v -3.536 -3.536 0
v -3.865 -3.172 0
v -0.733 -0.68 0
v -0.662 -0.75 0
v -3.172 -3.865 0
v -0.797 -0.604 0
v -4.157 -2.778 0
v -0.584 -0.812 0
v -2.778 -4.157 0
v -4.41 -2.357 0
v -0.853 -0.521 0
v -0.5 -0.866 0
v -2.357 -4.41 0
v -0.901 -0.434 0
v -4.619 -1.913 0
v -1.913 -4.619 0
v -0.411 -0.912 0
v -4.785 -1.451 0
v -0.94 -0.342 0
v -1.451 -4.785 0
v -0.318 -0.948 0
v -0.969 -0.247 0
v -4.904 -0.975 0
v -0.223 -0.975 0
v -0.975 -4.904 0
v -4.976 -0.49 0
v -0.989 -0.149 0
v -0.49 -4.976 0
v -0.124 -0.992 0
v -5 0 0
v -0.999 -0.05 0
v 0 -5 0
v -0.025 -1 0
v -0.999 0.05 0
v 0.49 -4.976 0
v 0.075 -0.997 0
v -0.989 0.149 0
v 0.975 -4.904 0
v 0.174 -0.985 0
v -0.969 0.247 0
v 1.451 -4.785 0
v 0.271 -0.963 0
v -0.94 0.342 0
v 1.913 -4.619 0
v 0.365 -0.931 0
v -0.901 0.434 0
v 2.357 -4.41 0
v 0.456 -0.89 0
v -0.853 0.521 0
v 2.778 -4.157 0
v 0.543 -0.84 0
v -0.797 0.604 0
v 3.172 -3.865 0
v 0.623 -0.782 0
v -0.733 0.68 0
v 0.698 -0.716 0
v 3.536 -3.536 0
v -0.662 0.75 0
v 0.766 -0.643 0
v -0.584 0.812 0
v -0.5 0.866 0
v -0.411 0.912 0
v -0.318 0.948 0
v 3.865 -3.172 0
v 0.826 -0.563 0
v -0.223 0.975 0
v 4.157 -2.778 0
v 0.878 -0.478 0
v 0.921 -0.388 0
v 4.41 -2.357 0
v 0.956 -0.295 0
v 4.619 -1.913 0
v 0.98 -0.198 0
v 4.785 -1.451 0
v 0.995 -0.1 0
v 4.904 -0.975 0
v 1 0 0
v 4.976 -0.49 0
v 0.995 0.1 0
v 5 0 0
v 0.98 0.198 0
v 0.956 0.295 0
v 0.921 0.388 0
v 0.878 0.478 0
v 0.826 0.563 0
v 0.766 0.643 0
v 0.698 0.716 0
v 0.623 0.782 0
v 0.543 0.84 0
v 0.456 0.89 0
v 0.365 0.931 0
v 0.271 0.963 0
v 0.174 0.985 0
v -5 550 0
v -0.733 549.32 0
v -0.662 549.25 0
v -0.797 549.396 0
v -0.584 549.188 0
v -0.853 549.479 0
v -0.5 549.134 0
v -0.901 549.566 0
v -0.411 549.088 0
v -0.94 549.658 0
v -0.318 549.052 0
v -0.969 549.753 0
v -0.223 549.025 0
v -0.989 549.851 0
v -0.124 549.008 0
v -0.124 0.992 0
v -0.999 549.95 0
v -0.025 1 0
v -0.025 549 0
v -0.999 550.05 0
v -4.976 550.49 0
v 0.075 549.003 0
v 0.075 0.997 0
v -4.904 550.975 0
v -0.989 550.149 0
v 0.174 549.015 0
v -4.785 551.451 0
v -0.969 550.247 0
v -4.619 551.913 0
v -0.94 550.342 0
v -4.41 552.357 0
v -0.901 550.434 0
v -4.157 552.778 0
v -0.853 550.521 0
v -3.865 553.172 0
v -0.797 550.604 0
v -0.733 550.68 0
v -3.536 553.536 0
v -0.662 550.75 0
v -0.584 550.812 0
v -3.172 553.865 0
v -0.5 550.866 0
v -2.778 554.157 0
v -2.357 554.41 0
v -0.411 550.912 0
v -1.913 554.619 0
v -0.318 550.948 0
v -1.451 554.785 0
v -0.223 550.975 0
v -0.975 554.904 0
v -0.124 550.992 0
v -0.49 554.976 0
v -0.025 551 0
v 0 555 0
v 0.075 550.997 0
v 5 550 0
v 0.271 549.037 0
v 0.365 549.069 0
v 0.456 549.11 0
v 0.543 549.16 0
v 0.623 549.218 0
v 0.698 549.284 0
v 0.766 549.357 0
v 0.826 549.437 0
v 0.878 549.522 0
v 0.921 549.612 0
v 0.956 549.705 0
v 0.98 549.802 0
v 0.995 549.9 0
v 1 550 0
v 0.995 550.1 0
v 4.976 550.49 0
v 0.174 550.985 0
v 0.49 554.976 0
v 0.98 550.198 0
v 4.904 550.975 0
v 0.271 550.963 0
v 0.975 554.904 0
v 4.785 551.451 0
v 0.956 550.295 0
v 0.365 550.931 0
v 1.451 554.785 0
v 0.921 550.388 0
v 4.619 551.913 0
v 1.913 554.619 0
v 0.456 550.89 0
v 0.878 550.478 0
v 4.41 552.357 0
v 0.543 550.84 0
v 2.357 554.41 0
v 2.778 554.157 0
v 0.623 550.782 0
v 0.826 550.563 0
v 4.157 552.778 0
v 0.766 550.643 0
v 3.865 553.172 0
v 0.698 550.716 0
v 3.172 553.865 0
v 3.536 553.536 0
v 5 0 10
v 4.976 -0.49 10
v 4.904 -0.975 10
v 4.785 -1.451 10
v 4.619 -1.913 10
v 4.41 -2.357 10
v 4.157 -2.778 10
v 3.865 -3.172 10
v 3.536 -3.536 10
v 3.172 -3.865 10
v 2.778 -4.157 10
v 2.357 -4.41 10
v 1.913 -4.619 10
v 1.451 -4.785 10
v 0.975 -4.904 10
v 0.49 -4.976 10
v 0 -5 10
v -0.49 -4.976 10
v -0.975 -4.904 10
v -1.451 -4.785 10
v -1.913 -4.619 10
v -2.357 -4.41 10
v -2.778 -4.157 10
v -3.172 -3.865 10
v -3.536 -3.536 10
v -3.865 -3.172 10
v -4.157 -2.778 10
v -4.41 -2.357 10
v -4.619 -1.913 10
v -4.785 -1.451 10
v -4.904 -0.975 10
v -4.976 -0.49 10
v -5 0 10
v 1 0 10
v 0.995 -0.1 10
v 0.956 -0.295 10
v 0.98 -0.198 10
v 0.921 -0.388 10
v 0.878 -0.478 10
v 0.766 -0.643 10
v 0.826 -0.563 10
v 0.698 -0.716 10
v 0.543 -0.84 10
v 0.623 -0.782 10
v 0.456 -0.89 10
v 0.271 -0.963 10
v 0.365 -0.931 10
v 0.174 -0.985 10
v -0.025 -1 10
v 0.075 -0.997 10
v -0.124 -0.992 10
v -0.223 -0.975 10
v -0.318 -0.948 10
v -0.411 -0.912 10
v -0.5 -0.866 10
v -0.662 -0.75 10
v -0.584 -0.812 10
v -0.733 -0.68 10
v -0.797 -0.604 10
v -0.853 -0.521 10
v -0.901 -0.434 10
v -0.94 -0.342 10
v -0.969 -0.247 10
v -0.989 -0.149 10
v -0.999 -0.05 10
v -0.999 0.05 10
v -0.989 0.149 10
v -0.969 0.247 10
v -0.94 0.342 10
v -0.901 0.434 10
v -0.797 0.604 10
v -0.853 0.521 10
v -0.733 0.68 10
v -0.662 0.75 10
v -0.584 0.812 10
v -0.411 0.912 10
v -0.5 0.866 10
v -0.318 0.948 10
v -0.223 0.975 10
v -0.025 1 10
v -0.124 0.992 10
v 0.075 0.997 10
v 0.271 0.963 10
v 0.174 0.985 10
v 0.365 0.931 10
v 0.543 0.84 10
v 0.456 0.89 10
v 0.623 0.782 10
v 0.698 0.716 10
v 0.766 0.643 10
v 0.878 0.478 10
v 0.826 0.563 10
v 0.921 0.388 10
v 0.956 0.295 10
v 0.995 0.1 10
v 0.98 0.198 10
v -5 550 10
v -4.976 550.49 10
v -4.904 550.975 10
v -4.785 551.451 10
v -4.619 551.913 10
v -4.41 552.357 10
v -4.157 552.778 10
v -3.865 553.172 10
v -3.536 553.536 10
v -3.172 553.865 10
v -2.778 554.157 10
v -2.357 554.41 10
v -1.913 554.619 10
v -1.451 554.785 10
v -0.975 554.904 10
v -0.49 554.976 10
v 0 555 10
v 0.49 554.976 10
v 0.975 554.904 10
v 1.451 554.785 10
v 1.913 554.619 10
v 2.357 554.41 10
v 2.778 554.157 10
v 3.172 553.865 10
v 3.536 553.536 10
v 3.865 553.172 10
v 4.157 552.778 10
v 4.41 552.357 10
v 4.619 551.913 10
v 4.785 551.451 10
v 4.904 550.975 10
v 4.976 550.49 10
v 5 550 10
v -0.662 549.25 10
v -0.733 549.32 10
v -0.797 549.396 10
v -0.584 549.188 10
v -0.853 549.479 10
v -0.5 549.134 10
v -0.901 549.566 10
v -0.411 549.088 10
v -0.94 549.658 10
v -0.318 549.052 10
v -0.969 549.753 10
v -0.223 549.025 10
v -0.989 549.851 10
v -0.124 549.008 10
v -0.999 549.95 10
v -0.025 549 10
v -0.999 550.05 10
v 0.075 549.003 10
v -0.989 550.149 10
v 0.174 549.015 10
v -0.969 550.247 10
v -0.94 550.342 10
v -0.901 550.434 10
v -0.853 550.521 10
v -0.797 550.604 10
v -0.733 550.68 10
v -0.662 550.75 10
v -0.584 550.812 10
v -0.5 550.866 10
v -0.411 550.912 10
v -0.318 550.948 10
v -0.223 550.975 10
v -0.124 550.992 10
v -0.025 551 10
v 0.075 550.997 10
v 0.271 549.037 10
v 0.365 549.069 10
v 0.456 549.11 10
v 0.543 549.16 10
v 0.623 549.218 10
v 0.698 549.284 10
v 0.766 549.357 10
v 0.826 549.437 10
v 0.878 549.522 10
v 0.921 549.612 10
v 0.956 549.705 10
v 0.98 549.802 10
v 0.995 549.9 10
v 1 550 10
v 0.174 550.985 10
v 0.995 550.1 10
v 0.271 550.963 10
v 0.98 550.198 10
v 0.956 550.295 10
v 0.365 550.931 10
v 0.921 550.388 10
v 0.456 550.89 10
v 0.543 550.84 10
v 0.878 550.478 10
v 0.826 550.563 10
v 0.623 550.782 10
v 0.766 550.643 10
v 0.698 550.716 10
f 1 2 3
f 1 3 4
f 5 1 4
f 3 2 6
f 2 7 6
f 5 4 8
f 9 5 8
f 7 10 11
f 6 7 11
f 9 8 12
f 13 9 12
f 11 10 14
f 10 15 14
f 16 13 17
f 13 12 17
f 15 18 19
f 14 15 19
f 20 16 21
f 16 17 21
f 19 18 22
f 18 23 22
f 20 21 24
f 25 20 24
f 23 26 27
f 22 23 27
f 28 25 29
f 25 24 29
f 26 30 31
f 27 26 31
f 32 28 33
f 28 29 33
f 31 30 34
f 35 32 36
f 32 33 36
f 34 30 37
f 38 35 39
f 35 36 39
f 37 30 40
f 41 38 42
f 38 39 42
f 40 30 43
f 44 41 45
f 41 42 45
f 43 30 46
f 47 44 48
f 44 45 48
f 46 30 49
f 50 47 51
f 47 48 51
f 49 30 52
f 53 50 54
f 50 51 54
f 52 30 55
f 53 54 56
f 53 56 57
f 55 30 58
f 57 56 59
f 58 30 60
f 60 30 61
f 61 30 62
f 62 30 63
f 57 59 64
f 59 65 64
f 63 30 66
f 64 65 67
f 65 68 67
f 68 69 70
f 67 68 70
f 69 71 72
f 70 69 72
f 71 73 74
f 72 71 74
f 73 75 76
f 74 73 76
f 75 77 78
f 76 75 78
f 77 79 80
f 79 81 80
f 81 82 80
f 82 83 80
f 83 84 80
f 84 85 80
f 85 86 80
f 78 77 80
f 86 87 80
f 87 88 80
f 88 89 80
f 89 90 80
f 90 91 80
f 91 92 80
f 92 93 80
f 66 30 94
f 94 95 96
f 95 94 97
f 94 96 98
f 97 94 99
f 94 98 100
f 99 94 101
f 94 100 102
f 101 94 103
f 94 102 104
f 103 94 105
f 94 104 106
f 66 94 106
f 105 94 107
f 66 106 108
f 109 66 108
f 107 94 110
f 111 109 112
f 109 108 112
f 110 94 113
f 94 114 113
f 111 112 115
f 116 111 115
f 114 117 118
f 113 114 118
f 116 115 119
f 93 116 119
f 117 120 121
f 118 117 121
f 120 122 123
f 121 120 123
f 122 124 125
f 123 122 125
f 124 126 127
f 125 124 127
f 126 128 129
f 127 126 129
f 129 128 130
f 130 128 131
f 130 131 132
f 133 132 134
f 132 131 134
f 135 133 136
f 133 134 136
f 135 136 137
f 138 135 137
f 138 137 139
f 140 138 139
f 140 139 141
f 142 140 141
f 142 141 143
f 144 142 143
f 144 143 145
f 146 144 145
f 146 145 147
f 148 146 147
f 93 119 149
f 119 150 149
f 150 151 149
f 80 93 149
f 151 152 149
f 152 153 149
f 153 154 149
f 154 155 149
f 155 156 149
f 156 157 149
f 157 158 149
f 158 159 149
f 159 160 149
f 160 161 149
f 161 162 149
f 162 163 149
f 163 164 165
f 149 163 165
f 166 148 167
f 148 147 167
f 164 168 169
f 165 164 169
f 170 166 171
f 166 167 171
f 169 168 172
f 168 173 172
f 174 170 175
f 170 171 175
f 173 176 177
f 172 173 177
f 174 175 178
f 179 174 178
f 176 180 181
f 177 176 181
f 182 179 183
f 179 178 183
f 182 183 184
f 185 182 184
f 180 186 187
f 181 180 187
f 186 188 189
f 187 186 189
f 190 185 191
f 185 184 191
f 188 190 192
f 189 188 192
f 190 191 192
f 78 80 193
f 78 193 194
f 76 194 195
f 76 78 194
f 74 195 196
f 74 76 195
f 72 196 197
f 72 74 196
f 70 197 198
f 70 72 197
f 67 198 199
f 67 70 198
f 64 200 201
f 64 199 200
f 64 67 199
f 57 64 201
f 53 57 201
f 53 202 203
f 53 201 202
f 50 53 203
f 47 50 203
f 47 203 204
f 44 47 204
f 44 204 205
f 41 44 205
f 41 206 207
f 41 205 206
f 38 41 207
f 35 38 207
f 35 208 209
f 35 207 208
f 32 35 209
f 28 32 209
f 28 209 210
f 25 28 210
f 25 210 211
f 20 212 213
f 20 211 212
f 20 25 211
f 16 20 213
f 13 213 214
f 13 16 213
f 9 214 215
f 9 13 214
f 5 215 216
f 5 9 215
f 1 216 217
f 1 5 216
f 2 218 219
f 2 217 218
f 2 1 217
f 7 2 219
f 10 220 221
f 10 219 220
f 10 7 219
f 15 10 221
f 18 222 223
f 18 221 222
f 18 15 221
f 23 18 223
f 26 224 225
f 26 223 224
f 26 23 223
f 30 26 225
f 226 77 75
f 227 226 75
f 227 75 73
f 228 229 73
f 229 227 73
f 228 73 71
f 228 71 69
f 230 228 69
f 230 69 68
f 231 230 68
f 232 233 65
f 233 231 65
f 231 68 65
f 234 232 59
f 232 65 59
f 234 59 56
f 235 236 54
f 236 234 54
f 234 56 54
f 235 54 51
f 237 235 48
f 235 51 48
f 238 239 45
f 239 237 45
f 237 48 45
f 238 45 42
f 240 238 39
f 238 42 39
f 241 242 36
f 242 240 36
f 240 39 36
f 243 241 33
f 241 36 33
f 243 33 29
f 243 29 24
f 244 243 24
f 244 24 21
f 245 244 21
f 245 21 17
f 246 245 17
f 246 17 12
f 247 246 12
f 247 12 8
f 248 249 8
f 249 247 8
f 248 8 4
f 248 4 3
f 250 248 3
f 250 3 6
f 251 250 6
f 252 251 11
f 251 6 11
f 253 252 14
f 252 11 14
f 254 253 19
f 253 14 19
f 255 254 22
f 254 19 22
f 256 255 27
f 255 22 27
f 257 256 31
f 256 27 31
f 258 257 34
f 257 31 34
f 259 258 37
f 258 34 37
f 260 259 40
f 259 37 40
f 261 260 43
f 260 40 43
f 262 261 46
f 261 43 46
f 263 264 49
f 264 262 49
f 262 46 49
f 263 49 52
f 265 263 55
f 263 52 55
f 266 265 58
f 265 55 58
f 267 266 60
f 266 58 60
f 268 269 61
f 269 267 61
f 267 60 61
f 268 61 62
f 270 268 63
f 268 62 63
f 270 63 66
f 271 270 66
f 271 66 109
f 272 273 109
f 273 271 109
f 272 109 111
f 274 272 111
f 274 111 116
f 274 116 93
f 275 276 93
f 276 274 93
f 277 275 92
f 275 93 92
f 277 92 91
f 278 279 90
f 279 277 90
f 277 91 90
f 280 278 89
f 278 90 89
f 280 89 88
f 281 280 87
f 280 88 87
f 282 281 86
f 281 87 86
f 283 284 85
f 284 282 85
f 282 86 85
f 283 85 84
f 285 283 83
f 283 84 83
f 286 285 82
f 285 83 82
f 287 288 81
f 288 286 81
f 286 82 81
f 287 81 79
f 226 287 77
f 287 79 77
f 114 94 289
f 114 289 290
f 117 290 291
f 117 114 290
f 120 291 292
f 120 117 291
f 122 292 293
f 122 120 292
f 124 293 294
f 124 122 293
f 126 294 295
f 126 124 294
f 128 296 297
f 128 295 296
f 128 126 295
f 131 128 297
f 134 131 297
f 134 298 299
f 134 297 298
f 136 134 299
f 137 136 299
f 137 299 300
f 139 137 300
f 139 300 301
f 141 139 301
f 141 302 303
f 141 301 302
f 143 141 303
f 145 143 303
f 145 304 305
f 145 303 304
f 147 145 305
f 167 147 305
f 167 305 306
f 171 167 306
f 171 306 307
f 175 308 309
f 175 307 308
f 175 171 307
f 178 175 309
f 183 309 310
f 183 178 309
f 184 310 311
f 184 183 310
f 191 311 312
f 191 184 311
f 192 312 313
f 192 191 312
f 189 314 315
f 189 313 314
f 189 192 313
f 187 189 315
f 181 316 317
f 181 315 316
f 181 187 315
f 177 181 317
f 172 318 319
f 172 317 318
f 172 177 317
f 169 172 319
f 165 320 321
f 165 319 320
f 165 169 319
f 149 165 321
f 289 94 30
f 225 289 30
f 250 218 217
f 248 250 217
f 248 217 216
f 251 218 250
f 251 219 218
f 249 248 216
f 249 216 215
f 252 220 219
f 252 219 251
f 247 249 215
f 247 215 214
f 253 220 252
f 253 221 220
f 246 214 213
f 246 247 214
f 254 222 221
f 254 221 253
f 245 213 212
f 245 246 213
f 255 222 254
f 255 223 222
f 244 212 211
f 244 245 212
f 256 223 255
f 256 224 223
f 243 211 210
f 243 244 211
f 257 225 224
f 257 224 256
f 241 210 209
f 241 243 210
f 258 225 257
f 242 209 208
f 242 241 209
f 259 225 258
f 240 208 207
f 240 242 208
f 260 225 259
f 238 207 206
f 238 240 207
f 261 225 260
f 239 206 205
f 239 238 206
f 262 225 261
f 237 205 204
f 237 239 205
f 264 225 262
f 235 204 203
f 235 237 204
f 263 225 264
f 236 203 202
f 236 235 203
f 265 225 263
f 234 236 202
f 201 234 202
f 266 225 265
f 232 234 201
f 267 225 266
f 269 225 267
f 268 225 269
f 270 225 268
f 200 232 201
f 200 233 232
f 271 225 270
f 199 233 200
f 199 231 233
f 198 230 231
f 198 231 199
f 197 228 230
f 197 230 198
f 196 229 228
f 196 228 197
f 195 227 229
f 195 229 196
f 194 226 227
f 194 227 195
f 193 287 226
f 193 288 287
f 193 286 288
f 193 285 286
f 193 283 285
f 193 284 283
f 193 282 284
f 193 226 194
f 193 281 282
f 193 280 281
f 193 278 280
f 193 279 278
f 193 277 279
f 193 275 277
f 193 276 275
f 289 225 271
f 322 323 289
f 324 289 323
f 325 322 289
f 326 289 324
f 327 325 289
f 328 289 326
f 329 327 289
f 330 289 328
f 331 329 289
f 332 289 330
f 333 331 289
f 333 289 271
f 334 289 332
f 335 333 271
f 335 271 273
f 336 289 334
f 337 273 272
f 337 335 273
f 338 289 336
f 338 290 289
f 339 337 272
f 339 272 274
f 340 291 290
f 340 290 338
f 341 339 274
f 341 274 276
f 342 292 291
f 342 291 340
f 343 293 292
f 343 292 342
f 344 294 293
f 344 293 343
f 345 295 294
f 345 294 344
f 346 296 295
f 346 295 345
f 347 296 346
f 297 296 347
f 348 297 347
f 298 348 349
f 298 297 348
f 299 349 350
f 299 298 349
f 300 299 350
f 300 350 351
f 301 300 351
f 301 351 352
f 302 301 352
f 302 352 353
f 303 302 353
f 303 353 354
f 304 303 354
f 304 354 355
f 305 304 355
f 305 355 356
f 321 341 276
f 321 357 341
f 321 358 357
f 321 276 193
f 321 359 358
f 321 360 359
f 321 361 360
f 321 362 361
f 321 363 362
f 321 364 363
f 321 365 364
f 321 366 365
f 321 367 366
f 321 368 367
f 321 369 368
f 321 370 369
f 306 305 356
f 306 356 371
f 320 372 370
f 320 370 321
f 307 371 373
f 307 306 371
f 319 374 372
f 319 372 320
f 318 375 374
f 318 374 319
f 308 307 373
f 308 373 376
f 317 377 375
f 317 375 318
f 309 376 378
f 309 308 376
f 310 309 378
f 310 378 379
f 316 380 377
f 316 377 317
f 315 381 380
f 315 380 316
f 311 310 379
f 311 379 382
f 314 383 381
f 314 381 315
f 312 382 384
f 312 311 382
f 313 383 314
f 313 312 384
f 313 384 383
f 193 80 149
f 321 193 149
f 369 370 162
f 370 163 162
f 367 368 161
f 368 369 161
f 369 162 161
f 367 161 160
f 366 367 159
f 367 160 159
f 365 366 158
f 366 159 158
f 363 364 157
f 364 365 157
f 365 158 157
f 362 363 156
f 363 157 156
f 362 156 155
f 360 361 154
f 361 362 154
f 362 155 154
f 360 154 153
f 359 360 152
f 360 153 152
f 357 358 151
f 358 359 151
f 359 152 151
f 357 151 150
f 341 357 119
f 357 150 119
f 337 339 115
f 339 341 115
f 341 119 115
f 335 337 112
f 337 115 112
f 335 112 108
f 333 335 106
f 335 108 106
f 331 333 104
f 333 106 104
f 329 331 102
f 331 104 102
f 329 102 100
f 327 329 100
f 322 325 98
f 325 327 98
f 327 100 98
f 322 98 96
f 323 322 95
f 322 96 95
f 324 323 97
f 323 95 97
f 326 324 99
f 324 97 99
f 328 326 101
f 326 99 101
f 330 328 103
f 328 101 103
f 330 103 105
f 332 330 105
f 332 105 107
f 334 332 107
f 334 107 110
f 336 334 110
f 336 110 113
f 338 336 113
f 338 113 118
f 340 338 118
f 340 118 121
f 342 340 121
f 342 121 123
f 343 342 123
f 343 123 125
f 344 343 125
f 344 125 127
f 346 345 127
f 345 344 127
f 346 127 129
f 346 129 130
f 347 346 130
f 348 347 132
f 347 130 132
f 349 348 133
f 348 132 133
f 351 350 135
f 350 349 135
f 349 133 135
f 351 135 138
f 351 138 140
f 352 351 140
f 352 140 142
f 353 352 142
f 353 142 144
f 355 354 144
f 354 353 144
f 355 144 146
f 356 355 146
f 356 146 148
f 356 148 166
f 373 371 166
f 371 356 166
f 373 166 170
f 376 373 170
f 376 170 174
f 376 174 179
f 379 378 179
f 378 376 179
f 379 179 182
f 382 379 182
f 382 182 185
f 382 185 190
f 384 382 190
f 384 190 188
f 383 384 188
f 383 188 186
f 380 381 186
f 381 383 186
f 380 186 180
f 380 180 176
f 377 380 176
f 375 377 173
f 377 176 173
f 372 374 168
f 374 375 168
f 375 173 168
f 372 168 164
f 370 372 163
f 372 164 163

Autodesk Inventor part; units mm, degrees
ref_plane "YZ Plane" through (0, 0, 0) normal (1, 0, 0) x (0, 1, 0)
ref_plane "XZ Plane" through (0, 0, 0) normal (0, 1, 0) x (-1, 0, 0)
ref_plane "XY Plane" through (0, 0, 0) normal (0, 0, 1) x (1, 0, 0)
sketch "Sketch1" plane through (0, 0, 0) normal (0, 0, 1) x (1, 0, 0)
  line L0 (0, 0) -> (0, 550) construction
  line L1 (5, 0) -> (5, 550)
  line L2 (-5, 550) -> (-5, 0)
  arc A0 (-5, 0) -> (5, 0) centre (0, 0) ccw
  arc A1 (5, 550) -> (-5, 550) centre (0, 550) ccw
  circle A2 centre (0, 0) radius 1
  circle A3 centre (0, 550) radius 1
  point P0 (0, 275)
  dimension "d0" = 550
  dimension "d1" = 10
  dimension "d2" = 2
  dimension "d3" = 2
extrude "Extrusion1" add sketch "Sketch1" along normal blind 10
properties material "Steel"
